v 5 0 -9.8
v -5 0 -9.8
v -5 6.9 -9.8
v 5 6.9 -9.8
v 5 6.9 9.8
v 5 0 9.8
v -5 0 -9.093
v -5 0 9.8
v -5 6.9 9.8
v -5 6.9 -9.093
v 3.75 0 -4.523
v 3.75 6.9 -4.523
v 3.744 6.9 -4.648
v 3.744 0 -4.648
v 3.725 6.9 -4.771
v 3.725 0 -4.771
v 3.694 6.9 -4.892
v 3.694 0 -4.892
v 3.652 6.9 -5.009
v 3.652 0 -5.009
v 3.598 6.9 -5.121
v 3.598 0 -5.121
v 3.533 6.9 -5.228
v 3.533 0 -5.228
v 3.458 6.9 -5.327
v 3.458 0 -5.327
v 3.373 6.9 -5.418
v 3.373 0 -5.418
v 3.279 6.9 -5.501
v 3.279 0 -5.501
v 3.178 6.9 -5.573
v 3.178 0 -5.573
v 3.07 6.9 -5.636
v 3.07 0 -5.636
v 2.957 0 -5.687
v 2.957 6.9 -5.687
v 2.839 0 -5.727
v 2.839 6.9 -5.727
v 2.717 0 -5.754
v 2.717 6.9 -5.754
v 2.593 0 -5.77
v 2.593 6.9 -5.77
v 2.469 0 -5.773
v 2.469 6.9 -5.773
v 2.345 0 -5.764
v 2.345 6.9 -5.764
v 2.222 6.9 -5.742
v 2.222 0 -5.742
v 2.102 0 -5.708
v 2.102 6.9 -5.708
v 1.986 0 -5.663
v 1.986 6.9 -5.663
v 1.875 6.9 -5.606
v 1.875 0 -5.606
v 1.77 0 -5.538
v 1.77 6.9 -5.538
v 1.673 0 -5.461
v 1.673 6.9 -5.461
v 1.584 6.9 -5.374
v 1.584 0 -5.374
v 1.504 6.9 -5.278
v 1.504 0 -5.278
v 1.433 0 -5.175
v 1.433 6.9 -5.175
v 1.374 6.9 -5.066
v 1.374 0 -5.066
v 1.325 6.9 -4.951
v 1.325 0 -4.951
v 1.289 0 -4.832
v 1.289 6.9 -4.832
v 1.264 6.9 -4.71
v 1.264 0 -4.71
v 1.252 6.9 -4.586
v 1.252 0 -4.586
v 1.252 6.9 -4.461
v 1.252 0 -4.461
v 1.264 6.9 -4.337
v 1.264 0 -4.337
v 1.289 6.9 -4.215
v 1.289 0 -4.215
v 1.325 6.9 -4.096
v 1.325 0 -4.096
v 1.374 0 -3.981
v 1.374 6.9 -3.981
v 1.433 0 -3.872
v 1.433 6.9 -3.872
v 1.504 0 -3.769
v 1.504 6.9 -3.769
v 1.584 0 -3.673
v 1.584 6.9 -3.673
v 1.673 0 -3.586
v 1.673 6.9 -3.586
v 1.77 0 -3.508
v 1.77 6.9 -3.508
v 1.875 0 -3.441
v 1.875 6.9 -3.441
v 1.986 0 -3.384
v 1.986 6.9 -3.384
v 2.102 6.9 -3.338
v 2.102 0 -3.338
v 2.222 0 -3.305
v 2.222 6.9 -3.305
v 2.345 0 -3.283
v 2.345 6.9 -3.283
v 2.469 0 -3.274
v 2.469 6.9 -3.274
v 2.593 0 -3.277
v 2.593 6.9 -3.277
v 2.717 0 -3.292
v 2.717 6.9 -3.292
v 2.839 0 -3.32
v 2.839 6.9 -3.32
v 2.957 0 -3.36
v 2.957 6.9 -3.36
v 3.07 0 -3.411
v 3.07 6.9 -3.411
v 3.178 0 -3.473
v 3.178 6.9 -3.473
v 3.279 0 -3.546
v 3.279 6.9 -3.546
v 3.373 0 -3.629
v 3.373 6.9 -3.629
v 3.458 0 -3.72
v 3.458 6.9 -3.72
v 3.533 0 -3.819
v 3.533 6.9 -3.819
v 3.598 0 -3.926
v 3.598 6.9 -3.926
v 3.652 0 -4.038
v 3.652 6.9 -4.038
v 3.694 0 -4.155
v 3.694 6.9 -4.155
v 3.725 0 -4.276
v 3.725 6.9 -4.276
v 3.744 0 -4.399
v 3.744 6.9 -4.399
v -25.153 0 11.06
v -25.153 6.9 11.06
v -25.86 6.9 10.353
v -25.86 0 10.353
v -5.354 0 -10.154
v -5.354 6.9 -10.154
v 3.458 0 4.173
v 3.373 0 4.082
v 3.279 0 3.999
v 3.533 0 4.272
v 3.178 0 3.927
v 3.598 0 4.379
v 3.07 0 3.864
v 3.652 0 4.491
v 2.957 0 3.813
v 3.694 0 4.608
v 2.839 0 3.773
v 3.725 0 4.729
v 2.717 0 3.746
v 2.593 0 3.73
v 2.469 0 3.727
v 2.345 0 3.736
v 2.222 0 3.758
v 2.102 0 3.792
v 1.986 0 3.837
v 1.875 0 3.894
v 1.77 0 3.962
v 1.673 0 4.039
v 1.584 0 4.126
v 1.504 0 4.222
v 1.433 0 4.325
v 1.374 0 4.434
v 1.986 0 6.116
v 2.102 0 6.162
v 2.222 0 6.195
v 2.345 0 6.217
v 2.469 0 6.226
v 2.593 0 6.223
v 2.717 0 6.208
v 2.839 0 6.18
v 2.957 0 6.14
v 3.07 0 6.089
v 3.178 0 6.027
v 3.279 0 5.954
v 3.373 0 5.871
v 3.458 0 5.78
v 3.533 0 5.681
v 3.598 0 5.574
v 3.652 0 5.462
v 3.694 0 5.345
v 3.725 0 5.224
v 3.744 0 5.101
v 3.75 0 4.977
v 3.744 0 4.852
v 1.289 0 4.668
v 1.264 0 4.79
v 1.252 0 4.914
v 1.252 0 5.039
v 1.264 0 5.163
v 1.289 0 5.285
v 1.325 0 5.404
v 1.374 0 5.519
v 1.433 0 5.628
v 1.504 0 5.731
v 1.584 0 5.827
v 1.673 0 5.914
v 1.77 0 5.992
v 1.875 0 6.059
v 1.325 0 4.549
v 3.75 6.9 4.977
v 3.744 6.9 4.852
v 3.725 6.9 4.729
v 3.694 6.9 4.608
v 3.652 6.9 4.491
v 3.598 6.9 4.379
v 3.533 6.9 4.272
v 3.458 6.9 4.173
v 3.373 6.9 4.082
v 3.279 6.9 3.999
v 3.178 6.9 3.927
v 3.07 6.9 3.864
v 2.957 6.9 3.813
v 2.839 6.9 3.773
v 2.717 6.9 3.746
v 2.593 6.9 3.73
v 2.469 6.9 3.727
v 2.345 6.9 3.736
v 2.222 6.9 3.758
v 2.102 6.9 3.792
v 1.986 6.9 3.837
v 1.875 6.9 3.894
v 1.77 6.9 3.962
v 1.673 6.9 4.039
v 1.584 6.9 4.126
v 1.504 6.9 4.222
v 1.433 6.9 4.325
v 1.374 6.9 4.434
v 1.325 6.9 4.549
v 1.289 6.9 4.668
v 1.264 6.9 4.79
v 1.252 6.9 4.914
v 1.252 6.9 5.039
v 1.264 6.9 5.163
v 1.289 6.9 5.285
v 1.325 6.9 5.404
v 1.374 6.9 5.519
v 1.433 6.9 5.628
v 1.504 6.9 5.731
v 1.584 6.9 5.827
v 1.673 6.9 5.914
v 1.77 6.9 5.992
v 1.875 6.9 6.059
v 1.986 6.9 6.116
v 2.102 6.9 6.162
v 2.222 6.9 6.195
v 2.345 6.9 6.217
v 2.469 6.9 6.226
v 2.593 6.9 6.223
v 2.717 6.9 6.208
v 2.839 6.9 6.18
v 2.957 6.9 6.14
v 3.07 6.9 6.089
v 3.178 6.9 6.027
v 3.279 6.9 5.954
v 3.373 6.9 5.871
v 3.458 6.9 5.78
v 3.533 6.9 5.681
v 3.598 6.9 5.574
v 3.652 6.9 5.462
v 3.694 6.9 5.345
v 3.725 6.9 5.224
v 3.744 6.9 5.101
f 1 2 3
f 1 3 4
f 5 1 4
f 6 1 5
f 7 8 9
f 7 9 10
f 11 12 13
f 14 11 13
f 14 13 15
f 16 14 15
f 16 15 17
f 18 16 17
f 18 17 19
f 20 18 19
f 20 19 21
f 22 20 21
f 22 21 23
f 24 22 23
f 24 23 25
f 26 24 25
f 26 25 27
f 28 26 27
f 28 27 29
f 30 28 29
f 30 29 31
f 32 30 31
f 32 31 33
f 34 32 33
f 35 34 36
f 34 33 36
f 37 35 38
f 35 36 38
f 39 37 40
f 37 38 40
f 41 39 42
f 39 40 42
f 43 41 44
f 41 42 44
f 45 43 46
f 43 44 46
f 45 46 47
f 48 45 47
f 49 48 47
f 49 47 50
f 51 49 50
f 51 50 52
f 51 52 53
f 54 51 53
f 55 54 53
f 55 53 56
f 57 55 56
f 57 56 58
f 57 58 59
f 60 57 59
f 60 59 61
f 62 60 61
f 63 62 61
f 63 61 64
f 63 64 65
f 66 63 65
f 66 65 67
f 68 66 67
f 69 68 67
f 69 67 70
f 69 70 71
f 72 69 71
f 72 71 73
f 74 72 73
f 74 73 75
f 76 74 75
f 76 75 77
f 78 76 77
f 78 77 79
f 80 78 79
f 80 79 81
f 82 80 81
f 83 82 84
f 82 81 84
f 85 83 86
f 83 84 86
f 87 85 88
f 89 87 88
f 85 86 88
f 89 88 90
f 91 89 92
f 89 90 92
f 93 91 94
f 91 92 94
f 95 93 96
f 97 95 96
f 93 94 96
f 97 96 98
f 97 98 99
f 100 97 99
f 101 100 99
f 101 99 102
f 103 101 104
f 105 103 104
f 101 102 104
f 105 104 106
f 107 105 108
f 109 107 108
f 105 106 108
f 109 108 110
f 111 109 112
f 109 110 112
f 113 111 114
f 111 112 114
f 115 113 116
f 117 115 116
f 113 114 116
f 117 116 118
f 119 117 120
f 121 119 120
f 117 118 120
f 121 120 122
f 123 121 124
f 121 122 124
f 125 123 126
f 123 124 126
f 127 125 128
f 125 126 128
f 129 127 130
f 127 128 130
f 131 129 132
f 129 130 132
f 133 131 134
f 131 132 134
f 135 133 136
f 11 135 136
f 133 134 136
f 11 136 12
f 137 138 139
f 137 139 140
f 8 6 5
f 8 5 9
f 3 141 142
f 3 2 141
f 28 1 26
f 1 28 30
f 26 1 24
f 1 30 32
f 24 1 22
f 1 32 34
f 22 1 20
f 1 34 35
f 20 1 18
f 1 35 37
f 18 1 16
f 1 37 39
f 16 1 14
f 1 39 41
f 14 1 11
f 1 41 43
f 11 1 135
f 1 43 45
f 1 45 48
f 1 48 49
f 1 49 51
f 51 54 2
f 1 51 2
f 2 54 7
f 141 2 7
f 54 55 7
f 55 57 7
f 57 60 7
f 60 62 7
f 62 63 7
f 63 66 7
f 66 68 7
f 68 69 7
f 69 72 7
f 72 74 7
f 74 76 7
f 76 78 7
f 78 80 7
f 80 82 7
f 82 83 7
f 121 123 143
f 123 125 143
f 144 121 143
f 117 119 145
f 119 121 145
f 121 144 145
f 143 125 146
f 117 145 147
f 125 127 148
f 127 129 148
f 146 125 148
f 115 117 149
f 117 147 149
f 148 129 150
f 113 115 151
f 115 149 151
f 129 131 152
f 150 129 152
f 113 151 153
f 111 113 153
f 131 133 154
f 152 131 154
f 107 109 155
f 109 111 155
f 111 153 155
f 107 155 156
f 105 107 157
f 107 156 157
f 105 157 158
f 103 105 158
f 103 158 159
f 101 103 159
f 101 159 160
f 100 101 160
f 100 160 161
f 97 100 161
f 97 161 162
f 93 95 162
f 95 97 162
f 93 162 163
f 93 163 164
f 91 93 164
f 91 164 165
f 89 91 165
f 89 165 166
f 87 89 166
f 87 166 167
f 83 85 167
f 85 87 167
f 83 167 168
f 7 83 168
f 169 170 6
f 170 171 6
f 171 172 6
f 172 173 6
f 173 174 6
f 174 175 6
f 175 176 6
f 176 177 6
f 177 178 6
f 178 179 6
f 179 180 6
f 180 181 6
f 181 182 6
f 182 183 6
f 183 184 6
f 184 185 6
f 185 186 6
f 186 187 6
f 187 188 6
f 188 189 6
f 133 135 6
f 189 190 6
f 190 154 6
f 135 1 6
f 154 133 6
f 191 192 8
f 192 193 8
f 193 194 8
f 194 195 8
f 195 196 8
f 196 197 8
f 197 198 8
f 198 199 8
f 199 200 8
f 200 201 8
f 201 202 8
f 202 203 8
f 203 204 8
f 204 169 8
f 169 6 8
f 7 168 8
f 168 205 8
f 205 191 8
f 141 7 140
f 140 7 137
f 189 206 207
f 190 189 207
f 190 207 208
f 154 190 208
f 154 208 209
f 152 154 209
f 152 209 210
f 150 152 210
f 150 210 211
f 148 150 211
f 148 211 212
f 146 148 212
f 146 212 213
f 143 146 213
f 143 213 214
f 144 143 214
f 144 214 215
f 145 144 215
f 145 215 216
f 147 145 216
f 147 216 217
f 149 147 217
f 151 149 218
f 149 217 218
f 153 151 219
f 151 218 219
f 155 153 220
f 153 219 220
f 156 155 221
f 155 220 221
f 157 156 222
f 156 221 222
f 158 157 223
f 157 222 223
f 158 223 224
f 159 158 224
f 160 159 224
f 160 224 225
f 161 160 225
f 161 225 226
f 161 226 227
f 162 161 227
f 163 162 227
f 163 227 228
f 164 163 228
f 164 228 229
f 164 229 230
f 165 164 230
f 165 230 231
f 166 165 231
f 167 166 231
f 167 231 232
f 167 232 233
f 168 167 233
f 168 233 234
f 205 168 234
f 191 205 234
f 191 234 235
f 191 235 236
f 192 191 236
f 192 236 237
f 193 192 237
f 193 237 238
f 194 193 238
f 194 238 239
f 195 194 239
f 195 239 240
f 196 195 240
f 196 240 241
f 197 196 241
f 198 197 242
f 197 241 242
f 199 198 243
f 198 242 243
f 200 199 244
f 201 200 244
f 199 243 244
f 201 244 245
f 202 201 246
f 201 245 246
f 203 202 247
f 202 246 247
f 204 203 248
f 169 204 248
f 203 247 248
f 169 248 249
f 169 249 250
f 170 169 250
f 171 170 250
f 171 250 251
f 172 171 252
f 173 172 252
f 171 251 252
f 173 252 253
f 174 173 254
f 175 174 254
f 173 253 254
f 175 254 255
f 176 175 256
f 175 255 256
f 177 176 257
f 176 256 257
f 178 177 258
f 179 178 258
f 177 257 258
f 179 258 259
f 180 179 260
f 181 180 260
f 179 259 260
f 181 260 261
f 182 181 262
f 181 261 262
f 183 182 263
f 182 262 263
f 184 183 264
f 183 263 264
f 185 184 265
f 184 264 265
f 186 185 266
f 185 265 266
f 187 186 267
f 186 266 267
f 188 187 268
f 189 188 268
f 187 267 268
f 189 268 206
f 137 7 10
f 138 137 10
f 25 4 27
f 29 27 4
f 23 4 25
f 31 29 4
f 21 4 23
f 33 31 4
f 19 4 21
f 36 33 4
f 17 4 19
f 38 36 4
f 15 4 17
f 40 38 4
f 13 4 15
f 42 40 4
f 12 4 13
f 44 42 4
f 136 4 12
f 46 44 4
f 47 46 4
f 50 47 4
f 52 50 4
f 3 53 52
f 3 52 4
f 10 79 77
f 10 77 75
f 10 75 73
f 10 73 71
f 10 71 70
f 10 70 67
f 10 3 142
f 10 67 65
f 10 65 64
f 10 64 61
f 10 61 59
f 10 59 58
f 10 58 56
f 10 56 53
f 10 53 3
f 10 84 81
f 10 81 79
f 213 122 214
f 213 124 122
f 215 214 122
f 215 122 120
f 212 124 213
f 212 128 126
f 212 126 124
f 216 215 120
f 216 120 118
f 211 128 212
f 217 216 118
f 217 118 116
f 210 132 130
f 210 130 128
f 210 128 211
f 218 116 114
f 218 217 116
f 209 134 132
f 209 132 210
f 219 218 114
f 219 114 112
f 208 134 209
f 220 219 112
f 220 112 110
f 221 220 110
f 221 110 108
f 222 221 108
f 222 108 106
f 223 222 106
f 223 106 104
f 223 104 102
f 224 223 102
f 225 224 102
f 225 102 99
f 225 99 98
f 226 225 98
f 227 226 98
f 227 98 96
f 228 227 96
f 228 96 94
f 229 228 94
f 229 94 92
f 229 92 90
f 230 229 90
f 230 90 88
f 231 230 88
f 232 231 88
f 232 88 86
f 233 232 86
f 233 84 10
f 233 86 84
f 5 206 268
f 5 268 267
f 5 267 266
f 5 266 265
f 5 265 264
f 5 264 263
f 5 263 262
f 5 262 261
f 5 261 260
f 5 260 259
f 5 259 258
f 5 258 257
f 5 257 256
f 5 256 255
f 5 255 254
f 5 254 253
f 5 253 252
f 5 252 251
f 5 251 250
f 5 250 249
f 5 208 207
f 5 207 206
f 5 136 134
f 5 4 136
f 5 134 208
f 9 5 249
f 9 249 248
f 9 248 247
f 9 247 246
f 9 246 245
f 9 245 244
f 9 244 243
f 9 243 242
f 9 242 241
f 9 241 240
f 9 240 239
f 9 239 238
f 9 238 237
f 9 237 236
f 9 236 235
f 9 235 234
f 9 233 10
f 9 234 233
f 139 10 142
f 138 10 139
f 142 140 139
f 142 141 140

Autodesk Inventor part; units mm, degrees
ref_plane "YZ Plane" through (0, 0, 0) normal (1, 0, 0) x (0, 1, 0)
ref_plane "XZ Plane" through (0, 0, 0) normal (0, 1, 0) x (-1, 0, 0)
sketch "Эскиз1" plane through (0, 0, 0) normal (0, 1, 0) x (-1, 0, 0)
  line L0 (5, -9.8) -> (-5, -9.8)
  line L1 (-5, -9.8) -> (-5, 9.8)
  line L2 (-5, 9.8) -> (5, 9.8)
  line L3 (5, 9.8) -> (5, -9.8)
  line L4 (5, -9.8) -> (-5, 9.8) construction
  line L5 (-5, -9.8) -> (5, 9.8) construction
  point P0 (0, 0)
  dimension "d0" = 10
  dimension "d1" = 19.6
extrude "Выдавливание1" add sketch "Эскиз1" along normal blind 6.9
sketch "Эскиз2" plane through (0, 6.9, 0) normal (0, 1, 0) x (1, 0, 0)
  circle A0 centre (2.5, -4.9766) radius 1.25
  circle A1 centre (2.5, 4.5234) radius 1.25
  line L0 (5, -9.8) -> (5, 9.8) projected
  line L1 (2.5, -4.9766) -> (2.5, -0.2266)
  line L2 (2.5, -0.2266) -> (2.5, 4.5234)
  point P0 (0, 0)
  dimension "d4" = 2.5
  dimension "d5" = 2.5
  dimension "d6" = 9.5
  dimension "d7" = 2.5
  dimension "d8" = 2.5
extrude "Выдавливание2" cut sketch "Эскиз2" against normal blind 6.9
ref_plane "РабПлоскость1" through (-5, 0, -9.8) normal (-0.7071, 0, -0.7071) x (0, 1, 0)
sketch "Эскиз3" plane through (-5, 0, -9.8) normal (-0.7071, 0, -0.7071) x (0, 1, 0)
  line L0 (0, 0) -> (6.9, 0) projected
  line L1 (0, 0) -> (6.9, 0)
  line L2 (6.9, 0) -> (6.9, -29)
  line L3 (6.9, -29) -> (0, -29)
  line L4 (0, -29) -> (0, 0)
  point P0 (0, -3.3941)
  dimension "d12" = 6.9
  dimension "d13" = 29
extrude "Выдавливание3" add sketch "Эскиз3" along normal mid plane 1
properties part number "концевик"
